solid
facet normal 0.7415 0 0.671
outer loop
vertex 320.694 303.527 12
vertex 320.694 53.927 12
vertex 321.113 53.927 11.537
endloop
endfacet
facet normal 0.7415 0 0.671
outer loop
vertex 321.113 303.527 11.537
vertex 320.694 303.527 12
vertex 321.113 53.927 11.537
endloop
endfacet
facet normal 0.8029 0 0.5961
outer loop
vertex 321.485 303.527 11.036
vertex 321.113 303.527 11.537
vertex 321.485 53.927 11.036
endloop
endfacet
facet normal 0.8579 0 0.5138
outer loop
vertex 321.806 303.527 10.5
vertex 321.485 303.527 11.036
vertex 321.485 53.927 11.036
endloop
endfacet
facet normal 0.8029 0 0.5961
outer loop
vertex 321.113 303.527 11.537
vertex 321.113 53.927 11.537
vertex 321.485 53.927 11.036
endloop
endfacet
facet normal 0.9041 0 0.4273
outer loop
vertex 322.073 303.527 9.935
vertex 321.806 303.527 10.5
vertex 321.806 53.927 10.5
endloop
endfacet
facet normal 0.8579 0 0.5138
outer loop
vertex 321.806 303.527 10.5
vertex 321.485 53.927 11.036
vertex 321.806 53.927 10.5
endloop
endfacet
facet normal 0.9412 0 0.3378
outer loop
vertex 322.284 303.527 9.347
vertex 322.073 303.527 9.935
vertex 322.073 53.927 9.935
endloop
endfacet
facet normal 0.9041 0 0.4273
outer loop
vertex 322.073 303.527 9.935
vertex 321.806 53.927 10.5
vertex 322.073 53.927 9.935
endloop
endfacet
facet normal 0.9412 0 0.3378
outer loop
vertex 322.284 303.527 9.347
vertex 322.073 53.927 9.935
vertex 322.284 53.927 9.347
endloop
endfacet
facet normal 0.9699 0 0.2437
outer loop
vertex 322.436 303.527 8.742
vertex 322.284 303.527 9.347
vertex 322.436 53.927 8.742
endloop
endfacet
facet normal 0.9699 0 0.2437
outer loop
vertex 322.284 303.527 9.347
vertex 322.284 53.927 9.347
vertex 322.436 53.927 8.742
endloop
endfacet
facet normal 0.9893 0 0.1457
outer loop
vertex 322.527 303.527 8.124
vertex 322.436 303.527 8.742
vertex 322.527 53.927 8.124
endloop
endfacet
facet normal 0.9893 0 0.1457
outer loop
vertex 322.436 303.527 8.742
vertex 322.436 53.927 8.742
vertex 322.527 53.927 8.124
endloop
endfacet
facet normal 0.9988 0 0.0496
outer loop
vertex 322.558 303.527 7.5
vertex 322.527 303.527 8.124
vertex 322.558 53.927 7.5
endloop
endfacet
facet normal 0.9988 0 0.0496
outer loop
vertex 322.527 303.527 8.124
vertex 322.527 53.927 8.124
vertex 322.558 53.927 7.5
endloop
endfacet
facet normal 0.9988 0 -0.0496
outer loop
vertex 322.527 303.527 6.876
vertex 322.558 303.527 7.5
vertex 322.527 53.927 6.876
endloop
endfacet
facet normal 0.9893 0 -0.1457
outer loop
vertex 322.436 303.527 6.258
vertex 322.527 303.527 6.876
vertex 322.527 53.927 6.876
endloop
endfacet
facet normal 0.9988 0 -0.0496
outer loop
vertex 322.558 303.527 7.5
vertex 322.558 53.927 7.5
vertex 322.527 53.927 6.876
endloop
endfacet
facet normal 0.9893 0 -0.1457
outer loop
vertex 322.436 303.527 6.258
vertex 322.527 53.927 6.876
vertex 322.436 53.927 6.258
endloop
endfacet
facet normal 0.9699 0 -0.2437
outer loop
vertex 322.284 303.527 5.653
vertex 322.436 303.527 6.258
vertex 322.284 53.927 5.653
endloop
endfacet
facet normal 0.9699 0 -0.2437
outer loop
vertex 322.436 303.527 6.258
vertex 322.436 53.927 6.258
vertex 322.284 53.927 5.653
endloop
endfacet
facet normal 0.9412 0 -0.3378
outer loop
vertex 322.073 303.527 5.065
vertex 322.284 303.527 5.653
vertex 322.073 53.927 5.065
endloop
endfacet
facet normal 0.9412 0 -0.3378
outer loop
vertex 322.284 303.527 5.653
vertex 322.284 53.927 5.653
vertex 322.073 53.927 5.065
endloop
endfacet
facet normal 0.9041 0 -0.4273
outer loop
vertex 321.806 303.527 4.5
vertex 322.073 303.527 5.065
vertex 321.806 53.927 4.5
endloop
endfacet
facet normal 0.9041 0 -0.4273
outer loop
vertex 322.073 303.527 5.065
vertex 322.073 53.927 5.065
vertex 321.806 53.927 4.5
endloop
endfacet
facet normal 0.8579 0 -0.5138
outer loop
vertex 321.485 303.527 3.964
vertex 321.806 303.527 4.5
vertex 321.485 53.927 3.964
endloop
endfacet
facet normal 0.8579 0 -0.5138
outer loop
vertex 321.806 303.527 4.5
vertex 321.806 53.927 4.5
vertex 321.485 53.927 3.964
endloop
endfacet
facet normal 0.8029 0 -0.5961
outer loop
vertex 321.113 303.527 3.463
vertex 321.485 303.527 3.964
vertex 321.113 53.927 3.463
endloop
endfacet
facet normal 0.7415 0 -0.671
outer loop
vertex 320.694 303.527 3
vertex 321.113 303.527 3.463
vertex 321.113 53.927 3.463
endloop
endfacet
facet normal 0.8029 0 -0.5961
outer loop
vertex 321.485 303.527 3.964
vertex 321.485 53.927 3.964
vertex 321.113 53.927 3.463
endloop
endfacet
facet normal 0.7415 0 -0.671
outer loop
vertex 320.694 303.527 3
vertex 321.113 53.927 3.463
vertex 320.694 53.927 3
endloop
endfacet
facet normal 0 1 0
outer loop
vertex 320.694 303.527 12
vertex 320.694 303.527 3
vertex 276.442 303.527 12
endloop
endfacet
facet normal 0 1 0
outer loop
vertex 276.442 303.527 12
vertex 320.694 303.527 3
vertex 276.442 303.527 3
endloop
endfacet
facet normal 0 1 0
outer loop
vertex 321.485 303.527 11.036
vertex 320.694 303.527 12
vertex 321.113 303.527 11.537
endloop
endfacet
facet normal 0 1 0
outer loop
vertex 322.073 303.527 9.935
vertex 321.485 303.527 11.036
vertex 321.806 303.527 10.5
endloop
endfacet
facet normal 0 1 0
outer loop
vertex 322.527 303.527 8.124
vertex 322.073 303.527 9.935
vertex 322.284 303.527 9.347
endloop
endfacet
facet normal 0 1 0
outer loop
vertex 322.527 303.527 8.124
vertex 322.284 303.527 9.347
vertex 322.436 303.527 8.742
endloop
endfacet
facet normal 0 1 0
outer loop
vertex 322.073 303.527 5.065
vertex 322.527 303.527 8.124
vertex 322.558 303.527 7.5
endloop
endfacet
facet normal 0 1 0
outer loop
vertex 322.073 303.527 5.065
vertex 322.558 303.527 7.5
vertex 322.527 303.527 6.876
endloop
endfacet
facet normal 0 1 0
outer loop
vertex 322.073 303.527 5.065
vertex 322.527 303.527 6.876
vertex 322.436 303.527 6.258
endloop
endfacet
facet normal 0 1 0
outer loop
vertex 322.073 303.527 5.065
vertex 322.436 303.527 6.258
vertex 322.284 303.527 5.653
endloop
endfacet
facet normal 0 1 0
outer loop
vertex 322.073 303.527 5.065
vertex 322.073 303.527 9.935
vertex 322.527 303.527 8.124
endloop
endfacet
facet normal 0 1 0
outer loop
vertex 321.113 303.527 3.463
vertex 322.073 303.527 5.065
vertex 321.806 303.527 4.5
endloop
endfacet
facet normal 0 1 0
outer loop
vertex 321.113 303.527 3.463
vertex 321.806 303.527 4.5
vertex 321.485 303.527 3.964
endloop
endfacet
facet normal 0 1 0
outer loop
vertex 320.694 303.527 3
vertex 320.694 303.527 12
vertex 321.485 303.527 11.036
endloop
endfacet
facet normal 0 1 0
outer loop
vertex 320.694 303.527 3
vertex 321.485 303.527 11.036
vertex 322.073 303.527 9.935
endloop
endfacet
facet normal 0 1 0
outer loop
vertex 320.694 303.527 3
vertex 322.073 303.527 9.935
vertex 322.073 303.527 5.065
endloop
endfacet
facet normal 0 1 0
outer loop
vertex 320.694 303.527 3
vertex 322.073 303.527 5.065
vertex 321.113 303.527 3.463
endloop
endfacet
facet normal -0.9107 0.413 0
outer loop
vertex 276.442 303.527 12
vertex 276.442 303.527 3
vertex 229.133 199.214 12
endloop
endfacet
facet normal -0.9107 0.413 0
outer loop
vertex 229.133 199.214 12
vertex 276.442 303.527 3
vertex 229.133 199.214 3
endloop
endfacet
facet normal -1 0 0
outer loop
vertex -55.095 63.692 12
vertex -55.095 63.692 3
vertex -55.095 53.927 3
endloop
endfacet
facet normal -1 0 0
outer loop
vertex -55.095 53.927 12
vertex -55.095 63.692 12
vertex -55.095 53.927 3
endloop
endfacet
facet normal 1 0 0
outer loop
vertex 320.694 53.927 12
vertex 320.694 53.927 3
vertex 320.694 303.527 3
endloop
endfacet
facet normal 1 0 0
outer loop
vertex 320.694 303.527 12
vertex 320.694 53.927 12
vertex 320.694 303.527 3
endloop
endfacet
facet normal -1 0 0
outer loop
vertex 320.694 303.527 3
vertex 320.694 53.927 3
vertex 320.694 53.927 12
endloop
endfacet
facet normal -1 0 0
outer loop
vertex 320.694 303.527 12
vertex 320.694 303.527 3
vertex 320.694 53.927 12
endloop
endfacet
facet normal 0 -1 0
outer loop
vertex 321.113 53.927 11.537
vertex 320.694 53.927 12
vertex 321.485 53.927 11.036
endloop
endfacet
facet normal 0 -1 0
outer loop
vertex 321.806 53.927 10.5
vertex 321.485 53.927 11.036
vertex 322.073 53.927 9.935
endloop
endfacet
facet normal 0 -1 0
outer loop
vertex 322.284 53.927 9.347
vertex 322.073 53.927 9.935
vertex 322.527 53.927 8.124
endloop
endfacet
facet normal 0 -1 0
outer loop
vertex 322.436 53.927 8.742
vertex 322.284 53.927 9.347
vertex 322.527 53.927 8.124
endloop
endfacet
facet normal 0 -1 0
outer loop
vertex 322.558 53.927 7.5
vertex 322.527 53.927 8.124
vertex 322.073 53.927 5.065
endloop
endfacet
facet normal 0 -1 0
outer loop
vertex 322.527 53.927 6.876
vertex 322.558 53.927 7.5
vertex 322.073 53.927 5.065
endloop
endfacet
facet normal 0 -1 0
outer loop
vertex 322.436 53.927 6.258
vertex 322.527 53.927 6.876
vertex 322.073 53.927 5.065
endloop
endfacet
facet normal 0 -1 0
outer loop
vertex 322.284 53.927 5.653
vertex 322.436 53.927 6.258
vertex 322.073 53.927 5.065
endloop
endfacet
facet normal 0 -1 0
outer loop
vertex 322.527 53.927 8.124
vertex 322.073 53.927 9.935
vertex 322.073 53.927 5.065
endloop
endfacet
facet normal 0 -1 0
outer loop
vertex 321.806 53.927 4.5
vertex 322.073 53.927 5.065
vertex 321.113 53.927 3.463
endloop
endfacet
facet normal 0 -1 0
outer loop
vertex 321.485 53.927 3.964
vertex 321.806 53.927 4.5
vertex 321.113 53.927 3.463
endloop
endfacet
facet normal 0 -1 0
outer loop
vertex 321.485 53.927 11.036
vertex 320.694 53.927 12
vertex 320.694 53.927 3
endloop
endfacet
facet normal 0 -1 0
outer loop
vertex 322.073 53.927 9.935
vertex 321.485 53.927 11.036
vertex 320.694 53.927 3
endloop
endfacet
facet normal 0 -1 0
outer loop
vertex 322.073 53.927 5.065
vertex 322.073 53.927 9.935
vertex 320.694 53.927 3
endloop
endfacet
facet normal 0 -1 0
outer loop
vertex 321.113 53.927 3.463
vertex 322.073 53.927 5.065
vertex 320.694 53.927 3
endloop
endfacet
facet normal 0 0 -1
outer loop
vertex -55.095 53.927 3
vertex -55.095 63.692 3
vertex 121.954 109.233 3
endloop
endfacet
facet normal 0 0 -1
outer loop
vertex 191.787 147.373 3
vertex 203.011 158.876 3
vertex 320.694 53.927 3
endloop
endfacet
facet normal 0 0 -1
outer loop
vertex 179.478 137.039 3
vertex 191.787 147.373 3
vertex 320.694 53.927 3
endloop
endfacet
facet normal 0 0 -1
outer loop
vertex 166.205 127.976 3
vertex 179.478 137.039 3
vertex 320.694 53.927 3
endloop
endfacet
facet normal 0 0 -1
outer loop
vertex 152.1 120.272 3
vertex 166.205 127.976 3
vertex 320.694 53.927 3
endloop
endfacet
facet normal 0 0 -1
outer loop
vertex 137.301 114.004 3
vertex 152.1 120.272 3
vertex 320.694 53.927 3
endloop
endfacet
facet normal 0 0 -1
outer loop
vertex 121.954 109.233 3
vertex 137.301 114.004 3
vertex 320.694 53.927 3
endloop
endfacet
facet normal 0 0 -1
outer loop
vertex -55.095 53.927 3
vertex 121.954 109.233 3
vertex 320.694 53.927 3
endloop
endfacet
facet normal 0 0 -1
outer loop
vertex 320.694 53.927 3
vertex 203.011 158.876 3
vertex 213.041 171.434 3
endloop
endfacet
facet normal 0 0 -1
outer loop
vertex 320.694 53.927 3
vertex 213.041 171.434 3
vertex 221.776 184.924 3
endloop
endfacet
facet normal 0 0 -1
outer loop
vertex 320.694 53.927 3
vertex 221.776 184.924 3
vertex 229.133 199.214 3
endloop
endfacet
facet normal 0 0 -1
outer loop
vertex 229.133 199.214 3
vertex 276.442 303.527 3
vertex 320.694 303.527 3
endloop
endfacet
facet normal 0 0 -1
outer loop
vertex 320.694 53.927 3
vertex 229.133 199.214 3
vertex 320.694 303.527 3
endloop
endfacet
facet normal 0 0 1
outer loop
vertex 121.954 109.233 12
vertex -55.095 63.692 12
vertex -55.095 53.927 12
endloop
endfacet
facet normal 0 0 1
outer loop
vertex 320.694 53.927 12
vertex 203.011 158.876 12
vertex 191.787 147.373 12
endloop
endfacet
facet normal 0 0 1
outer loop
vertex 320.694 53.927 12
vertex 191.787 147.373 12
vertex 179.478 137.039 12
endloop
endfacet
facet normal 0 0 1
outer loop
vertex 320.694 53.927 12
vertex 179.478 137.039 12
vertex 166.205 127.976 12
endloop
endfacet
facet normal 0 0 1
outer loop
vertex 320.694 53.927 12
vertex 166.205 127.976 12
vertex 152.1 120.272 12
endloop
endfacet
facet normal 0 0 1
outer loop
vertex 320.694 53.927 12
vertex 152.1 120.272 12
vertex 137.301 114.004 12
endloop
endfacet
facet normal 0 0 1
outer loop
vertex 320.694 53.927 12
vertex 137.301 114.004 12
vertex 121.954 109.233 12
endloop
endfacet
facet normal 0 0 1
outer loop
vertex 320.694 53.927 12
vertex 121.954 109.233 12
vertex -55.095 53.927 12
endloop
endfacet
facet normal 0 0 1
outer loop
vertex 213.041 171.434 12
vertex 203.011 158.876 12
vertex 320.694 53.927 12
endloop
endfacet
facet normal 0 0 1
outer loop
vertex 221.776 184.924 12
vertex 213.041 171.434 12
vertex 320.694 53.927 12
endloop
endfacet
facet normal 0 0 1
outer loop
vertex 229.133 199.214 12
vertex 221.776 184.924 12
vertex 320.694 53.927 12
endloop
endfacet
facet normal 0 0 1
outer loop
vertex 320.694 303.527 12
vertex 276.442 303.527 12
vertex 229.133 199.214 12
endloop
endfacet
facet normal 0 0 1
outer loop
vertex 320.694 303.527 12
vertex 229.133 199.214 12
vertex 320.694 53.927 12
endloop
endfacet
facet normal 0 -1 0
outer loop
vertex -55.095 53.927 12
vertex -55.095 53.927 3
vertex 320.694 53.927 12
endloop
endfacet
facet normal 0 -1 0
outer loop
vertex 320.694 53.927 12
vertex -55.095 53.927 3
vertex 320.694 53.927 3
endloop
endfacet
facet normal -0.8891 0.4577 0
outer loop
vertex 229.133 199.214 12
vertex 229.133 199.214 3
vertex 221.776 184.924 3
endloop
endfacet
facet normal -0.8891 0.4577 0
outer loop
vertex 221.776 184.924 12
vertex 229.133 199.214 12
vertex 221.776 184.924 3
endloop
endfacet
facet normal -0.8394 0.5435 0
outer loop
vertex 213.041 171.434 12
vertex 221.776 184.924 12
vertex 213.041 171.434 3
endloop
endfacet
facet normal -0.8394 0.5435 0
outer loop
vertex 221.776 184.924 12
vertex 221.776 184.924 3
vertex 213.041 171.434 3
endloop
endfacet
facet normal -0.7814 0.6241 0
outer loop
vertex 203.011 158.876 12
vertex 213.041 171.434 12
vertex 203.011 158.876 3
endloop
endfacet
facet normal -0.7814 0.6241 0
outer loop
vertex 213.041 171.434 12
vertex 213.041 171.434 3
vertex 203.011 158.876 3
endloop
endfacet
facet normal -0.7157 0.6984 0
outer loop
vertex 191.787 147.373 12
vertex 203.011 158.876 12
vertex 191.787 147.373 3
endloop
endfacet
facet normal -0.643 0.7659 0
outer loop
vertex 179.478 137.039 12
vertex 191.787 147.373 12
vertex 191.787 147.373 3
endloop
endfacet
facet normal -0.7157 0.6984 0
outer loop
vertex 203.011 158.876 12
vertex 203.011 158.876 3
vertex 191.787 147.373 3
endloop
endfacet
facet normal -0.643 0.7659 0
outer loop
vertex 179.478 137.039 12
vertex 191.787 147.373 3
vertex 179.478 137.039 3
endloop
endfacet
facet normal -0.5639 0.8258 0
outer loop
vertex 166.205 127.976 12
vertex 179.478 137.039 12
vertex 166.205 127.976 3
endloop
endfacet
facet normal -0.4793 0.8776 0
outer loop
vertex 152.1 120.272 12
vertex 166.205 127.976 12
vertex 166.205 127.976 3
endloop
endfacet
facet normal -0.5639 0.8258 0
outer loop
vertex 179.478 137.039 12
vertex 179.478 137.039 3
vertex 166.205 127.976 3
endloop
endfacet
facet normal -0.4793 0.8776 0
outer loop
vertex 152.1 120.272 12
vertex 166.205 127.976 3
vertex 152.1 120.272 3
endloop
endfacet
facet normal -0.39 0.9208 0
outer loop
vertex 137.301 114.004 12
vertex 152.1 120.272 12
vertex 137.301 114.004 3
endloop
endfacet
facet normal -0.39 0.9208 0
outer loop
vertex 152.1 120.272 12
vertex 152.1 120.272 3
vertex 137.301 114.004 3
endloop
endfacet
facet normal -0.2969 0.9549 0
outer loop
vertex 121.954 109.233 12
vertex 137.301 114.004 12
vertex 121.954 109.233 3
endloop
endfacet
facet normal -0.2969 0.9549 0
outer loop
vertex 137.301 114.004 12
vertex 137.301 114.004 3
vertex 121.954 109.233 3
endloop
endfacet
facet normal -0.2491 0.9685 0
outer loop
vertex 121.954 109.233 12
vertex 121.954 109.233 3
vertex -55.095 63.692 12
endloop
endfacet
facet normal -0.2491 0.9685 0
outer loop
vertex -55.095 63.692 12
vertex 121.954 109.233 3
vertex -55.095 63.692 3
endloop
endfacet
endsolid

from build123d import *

# Parameters (mm, degrees)
BOSS_EXTRUDE1_DEPTH      = 15
SCALE1_SCALE             = 0.6
BOSS_EXTRUDE3_DEPTH      = 119.026868
BOSS_EXTRUDE3_DEPTH_BACK = 130.573132


with BuildPart() as part:
    # Sketch1 → Boss-Extrude1 (new body)
    with BuildSketch(Plane.XY):
        with BuildLine():
            Line((-236.729376996, 0), (0, 0))
            Line((0, 0), (389.585255443, 0))
            Line((389.585255443, 0), (389.585255443, 416))
            Line((389.585255443, 416), (315.832809595, 416))
            Line((315.832809595, 416), (236.983089551, 242.144494596))
            ThreePointArc((236.983089551, 242.144494596), (164.696190822, 146.877858304), (58.352308735, 92.177707838))
            Line((58.352308735, 92.177707838), (-236.729376996, 16.274880501))
            Line((-236.729376996, 16.274880501), (-236.729376996, 0))
        make_face()
    extrude(amount=BOSS_EXTRUDE1_DEPTH)


with BuildPart() as part_1:
    # Scale1: scaled about (217.356894213, 134.817169742, 7.5)
    add(part.part.scale(SCALE1_SCALE).moved(Location((86.942757685, 53.926867897, 3))))


with BuildPart() as body_2:
    # Sketch3 → Boss-Extrude3 (new, two sides: drawn at the far end of the back side and taken through both)
    with BuildSketch(Plane(origin=(0, 184.5, 0), x_dir=(1, 0, 0), z_dir=(0, 1, 0)).offset(-BOSS_EXTRUDE3_DEPTH_BACK)):
        with BuildLine():
            Line((320.693910951, -3), (320.693910951, -12))
            ThreePointArc((320.693910951, -12), (322.557871982, -7.5), (320.693910951, -3))
        make_face()
    extrude(amount=BOSS_EXTRUDE3_DEPTH + BOSS_EXTRUDE3_DEPTH_BACK)


solid = Compound([part_1.part, body_2.part])
